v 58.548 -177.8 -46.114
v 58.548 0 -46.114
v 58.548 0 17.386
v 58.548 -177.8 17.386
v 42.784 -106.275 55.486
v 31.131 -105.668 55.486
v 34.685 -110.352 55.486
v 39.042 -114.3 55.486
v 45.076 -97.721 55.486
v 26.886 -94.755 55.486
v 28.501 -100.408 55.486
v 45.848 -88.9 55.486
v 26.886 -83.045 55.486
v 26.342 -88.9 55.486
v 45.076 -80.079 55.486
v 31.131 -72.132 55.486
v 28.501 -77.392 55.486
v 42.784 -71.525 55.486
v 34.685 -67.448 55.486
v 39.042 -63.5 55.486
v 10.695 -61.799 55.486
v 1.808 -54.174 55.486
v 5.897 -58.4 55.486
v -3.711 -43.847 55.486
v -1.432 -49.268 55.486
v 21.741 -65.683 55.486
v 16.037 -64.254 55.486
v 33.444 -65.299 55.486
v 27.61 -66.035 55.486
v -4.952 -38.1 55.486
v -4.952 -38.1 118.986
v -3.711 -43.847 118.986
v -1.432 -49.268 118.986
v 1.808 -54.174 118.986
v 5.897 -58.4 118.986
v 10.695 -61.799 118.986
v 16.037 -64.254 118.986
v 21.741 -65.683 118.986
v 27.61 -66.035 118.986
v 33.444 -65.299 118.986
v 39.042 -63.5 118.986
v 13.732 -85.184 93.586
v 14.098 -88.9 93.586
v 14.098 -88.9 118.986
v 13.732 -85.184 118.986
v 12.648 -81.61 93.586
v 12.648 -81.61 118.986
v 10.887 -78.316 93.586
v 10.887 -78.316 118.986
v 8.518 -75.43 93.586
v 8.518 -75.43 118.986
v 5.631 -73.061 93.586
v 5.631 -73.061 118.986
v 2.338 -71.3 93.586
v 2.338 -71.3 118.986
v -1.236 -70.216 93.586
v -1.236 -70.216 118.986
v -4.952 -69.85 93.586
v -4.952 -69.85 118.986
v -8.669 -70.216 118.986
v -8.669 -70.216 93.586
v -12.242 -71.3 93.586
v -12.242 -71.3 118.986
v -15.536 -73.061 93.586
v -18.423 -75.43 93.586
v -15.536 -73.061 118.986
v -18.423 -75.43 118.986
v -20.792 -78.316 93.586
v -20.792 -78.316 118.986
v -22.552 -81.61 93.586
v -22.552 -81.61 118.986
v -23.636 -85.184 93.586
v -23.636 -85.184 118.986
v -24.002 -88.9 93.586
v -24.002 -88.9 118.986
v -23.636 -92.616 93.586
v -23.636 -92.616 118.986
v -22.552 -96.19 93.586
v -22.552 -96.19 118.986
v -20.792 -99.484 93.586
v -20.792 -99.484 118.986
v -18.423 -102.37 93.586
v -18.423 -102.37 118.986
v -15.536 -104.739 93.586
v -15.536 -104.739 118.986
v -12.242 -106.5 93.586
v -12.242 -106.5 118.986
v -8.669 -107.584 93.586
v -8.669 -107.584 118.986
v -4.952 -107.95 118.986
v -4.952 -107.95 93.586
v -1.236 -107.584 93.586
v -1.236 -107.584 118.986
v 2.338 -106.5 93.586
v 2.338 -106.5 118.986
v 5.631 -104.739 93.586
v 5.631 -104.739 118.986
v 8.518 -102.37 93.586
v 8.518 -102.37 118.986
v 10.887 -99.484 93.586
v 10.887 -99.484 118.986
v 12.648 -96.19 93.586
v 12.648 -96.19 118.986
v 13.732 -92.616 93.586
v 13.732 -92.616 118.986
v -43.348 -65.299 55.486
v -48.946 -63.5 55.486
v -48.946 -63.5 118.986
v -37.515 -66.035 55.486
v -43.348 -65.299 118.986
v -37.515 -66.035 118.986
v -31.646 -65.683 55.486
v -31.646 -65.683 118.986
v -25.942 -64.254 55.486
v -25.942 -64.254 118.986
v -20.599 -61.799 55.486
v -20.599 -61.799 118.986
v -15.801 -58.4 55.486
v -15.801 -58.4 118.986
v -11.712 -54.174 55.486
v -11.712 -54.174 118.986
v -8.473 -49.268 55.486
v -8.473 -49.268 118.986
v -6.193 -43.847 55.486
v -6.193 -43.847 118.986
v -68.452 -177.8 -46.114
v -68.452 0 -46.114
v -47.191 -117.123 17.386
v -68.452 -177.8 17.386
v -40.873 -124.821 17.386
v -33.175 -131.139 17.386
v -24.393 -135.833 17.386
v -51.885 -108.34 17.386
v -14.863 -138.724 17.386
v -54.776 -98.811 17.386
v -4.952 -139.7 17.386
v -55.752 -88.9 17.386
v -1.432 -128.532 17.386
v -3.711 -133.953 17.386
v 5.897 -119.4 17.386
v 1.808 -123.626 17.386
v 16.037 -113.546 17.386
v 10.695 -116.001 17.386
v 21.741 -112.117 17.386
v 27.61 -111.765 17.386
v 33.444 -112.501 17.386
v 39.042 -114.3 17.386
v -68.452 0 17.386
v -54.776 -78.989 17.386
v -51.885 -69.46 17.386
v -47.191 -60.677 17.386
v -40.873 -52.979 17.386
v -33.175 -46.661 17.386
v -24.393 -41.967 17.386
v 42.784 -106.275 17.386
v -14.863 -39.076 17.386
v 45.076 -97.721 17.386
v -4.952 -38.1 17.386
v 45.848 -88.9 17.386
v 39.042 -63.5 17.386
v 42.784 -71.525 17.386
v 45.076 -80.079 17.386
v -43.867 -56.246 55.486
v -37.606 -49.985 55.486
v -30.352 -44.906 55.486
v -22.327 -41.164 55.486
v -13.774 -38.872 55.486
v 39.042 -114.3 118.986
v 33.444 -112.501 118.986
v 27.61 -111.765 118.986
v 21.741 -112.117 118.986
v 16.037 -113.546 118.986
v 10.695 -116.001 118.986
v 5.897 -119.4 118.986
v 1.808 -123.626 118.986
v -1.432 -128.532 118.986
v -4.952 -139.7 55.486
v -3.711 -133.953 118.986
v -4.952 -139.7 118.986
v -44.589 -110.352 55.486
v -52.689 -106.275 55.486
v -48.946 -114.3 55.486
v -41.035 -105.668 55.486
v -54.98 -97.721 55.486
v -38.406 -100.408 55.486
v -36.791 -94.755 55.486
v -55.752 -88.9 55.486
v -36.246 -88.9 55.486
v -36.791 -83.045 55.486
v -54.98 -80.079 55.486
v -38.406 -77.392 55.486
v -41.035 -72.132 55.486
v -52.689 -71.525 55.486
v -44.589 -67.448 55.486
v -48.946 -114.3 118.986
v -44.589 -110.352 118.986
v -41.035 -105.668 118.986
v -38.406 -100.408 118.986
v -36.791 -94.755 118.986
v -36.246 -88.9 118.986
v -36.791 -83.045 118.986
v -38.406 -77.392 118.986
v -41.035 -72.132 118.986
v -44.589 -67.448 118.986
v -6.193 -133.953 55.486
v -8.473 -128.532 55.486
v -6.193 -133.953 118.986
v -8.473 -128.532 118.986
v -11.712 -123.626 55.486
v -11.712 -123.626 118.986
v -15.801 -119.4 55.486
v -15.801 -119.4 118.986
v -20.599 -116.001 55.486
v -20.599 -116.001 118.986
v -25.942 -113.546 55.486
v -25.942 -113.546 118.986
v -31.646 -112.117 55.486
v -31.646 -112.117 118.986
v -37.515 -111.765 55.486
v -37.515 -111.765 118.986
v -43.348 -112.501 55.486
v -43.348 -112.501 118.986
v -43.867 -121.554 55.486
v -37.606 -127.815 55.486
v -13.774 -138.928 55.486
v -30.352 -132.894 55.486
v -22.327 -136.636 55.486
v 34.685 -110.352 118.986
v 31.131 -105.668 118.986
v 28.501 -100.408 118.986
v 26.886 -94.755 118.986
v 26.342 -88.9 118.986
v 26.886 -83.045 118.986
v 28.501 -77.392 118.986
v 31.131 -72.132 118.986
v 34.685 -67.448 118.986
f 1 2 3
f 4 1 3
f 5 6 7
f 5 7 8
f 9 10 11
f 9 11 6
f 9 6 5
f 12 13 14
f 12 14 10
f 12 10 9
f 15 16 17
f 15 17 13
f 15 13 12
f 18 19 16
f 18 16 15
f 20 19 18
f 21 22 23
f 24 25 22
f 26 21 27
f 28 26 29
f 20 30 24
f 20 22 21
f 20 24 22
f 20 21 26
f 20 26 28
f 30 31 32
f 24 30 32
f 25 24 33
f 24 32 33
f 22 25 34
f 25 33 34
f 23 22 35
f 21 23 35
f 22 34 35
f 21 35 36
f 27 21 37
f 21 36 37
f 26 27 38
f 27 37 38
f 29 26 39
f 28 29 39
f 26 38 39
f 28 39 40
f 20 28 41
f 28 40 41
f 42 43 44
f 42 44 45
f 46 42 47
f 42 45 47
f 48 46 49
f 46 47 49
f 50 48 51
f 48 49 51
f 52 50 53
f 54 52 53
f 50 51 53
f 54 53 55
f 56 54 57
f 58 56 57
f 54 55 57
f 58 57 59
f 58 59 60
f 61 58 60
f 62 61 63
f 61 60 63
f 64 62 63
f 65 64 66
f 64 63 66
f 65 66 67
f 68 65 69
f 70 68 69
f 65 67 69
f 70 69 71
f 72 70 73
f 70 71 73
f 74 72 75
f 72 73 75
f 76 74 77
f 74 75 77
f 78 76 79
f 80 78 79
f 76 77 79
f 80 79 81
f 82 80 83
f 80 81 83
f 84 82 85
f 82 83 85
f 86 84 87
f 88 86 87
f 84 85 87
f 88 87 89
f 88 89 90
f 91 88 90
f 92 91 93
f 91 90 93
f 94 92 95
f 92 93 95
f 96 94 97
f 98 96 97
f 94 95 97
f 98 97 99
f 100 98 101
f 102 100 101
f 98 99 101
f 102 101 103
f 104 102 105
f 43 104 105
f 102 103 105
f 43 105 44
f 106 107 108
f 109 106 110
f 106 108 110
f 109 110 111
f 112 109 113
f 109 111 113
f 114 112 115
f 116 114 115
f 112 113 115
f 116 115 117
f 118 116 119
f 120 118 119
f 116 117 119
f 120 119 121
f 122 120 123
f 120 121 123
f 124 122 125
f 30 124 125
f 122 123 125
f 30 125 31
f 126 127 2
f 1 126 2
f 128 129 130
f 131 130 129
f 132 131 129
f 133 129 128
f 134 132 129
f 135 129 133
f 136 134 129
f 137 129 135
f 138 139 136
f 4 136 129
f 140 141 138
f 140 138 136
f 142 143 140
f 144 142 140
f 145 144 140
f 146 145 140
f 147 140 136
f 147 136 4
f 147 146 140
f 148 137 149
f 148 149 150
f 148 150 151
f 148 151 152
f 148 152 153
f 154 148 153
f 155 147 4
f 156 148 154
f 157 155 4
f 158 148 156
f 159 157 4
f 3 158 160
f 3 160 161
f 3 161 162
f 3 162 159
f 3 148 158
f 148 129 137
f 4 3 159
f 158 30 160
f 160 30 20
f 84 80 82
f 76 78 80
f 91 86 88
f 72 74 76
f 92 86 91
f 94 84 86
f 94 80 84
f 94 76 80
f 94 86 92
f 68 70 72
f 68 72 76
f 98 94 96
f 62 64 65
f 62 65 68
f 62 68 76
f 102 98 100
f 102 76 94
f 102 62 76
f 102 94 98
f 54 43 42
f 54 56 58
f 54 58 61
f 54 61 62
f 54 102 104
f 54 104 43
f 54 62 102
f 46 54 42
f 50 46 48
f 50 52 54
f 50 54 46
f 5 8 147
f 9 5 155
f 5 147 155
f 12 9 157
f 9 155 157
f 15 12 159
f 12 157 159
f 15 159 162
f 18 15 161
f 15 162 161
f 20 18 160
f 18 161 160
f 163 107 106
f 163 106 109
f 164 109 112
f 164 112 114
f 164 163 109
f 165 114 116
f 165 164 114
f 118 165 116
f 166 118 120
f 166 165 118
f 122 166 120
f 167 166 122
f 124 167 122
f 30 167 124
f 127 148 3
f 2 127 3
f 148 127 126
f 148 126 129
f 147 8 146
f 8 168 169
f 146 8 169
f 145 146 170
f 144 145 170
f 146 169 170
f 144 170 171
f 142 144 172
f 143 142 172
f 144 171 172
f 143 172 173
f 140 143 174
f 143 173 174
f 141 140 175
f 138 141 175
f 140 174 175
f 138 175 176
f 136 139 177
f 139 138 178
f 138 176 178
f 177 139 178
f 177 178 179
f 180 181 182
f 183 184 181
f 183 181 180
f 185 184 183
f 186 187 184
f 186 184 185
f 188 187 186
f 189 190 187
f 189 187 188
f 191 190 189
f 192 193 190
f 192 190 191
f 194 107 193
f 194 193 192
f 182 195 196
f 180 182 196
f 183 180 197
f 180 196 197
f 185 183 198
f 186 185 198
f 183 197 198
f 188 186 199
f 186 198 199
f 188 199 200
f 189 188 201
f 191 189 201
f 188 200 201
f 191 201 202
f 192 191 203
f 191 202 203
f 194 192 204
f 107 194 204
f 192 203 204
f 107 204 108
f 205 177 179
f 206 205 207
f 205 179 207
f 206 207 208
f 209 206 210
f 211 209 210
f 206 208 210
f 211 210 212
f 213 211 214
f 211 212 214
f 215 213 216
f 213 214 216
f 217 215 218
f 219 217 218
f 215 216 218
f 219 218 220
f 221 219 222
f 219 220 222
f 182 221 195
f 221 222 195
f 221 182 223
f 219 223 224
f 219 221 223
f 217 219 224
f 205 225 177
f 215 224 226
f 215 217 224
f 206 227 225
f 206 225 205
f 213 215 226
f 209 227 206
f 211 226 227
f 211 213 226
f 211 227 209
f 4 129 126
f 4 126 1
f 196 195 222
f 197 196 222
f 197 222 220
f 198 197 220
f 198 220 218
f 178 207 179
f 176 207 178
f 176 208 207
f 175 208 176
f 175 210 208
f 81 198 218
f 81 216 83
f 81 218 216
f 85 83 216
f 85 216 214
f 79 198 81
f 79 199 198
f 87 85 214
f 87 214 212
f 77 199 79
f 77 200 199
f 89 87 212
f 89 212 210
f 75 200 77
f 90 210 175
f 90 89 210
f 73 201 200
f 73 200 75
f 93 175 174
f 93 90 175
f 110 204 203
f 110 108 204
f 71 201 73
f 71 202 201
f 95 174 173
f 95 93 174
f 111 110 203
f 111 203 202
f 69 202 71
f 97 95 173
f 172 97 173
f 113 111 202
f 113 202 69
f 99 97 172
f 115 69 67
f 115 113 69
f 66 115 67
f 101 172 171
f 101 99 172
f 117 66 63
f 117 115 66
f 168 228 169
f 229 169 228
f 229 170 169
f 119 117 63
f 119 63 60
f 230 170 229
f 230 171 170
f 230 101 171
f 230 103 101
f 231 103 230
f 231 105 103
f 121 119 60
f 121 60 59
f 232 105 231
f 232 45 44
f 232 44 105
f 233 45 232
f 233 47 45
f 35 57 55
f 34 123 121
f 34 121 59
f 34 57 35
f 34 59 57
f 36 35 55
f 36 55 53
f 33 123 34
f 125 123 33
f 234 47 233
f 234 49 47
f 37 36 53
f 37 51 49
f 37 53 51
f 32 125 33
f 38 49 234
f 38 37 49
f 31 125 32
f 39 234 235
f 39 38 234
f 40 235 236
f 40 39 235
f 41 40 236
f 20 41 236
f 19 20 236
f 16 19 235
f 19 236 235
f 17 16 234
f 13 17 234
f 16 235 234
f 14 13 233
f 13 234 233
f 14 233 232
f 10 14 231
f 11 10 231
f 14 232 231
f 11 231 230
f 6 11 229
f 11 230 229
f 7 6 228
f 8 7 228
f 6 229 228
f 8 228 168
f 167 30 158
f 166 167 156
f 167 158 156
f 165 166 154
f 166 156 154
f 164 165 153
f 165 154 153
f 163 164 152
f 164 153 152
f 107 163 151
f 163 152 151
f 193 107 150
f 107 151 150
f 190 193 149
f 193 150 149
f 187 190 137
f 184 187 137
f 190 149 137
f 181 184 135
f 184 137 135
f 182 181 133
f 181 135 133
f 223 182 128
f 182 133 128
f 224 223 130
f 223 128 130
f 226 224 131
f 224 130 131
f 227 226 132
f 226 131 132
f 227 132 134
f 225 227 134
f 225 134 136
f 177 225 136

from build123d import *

# Parameters (mm, degrees)
F0_W      = 127
F0_H      = 63.5
F1_DEPTH  = 177.8
F2_R      = 50.8
F3_DEPTH  = 101.6
F5_DEPTH  = 63.5
F6_R      = 19.05
F7_DEPTH  = 25.4
F9_DEPTH  = 38.1
F11_DEPTH = 38.1


with BuildPart() as f1:
    # F0 (on Front) → F1 (new body)
    with BuildSketch(Plane.XZ):
        with Locations((-4.952263087, -14.3639492443)):
            Rectangle(F0_W, F0_H)
    extrude(amount=F1_DEPTH)

    # F2 (on face) → F3 (join)
    with BuildSketch(Plane.XY.offset(17.3860507557)):
        with Locations((-4.952263087, -88.9)):
            Circle(F2_R)
    extrude(amount=F3_DEPTH)

    # F4 (on face) → F5 (cut)
    with BuildSketch(Plane.XY.offset(118.9860507557)):
        with BuildLine():
            ThreePointArc((-4.952263087, -38.1), (-30.352263087, -44.9059094878), (-48.9463535993, -63.5))
            ThreePointArc((-48.9463535993, -63.5), (-20.5993083432, -61.7985226281), (-4.952263087, -38.1))
        make_face()
        with BuildLine():
            ThreePointArc((39.0418274252, -63.5), (20.447736913, -44.9059094878), (-4.952263087, -38.1))
            ThreePointArc((-4.952263087, -38.1), (10.6947821691, -61.7985226281), (39.0418274252, -63.5))
        make_face()
        with BuildLine():
            ThreePointArc((45.847736913, -88.9), (44.1167688885, -75.7519925088), (39.0418274252, -63.5))
            ThreePointArc((39.0418274252, -63.5), (26.3418274252, -88.9), (39.0418274252, -114.3))
            ThreePointArc((39.0418274252, -114.3), (44.1167688885, -102.0480074912), (45.847736913, -88.9))
        make_face()
        with BuildLine():
            ThreePointArc((39.0418274252, -114.3), (10.6947821691, -116.0014773719), (-4.952263087, -139.7))
            ThreePointArc((-4.952263087, -139.7), (20.447736913, -132.8940905122), (39.0418274252, -114.3))
        make_face()
        with BuildLine():
            ThreePointArc((-4.952263087, -139.7), (-20.5993083432, -116.0014773719), (-48.9463535993, -114.3))
            ThreePointArc((-48.9463535993, -114.3), (-30.352263087, -132.8940905122), (-4.952263087, -139.7))
        make_face()
        with BuildLine():
            ThreePointArc((-48.9463535993, -114.3), (-36.2463535993, -88.9), (-48.9463535993, -63.5))
            ThreePointArc((-48.9463535993, -63.5), (-55.752263087, -88.9), (-48.9463535993, -114.3))
        make_face()
    extrude(amount=-F5_DEPTH, mode=Mode.SUBTRACT)

    # F6 (on face) → F7 (cut)
    with BuildSketch(Plane.XY.offset(118.9860507557)):
        with Locations((-4.952263087, -88.9)):
            Circle(F6_R)
    extrude(amount=-F7_DEPTH, mode=Mode.SUBTRACT)

    # F8 (on face) → F9 (cut)
    with BuildSketch(Plane.XY.offset(55.4860507557)):
        with BuildLine():
            ThreePointArc((-4.952263087, -139.7), (20.447736913, -132.8940905122), (39.0418274252, -114.3))
            ThreePointArc((39.0418274252, -114.3), (10.6947821691, -116.0014773719), (-4.952263087, -139.7))
        make_face()
    extrude(amount=-F9_DEPTH, mode=Mode.SUBTRACT)

    # F10 (on face) → F11 (cut)
    with BuildSketch(Plane.XY.offset(55.4860507557)):
        with BuildLine():
            Line((-4.952263087, -38.1), (39.0418274252, -63.5))
            ThreePointArc((39.0418274252, -63.5), (20.447736913, -44.9059094878), (-4.952263087, -38.1))
        make_face()
    extrude(amount=-F11_DEPTH, mode=Mode.SUBTRACT)


solid = f1.part
